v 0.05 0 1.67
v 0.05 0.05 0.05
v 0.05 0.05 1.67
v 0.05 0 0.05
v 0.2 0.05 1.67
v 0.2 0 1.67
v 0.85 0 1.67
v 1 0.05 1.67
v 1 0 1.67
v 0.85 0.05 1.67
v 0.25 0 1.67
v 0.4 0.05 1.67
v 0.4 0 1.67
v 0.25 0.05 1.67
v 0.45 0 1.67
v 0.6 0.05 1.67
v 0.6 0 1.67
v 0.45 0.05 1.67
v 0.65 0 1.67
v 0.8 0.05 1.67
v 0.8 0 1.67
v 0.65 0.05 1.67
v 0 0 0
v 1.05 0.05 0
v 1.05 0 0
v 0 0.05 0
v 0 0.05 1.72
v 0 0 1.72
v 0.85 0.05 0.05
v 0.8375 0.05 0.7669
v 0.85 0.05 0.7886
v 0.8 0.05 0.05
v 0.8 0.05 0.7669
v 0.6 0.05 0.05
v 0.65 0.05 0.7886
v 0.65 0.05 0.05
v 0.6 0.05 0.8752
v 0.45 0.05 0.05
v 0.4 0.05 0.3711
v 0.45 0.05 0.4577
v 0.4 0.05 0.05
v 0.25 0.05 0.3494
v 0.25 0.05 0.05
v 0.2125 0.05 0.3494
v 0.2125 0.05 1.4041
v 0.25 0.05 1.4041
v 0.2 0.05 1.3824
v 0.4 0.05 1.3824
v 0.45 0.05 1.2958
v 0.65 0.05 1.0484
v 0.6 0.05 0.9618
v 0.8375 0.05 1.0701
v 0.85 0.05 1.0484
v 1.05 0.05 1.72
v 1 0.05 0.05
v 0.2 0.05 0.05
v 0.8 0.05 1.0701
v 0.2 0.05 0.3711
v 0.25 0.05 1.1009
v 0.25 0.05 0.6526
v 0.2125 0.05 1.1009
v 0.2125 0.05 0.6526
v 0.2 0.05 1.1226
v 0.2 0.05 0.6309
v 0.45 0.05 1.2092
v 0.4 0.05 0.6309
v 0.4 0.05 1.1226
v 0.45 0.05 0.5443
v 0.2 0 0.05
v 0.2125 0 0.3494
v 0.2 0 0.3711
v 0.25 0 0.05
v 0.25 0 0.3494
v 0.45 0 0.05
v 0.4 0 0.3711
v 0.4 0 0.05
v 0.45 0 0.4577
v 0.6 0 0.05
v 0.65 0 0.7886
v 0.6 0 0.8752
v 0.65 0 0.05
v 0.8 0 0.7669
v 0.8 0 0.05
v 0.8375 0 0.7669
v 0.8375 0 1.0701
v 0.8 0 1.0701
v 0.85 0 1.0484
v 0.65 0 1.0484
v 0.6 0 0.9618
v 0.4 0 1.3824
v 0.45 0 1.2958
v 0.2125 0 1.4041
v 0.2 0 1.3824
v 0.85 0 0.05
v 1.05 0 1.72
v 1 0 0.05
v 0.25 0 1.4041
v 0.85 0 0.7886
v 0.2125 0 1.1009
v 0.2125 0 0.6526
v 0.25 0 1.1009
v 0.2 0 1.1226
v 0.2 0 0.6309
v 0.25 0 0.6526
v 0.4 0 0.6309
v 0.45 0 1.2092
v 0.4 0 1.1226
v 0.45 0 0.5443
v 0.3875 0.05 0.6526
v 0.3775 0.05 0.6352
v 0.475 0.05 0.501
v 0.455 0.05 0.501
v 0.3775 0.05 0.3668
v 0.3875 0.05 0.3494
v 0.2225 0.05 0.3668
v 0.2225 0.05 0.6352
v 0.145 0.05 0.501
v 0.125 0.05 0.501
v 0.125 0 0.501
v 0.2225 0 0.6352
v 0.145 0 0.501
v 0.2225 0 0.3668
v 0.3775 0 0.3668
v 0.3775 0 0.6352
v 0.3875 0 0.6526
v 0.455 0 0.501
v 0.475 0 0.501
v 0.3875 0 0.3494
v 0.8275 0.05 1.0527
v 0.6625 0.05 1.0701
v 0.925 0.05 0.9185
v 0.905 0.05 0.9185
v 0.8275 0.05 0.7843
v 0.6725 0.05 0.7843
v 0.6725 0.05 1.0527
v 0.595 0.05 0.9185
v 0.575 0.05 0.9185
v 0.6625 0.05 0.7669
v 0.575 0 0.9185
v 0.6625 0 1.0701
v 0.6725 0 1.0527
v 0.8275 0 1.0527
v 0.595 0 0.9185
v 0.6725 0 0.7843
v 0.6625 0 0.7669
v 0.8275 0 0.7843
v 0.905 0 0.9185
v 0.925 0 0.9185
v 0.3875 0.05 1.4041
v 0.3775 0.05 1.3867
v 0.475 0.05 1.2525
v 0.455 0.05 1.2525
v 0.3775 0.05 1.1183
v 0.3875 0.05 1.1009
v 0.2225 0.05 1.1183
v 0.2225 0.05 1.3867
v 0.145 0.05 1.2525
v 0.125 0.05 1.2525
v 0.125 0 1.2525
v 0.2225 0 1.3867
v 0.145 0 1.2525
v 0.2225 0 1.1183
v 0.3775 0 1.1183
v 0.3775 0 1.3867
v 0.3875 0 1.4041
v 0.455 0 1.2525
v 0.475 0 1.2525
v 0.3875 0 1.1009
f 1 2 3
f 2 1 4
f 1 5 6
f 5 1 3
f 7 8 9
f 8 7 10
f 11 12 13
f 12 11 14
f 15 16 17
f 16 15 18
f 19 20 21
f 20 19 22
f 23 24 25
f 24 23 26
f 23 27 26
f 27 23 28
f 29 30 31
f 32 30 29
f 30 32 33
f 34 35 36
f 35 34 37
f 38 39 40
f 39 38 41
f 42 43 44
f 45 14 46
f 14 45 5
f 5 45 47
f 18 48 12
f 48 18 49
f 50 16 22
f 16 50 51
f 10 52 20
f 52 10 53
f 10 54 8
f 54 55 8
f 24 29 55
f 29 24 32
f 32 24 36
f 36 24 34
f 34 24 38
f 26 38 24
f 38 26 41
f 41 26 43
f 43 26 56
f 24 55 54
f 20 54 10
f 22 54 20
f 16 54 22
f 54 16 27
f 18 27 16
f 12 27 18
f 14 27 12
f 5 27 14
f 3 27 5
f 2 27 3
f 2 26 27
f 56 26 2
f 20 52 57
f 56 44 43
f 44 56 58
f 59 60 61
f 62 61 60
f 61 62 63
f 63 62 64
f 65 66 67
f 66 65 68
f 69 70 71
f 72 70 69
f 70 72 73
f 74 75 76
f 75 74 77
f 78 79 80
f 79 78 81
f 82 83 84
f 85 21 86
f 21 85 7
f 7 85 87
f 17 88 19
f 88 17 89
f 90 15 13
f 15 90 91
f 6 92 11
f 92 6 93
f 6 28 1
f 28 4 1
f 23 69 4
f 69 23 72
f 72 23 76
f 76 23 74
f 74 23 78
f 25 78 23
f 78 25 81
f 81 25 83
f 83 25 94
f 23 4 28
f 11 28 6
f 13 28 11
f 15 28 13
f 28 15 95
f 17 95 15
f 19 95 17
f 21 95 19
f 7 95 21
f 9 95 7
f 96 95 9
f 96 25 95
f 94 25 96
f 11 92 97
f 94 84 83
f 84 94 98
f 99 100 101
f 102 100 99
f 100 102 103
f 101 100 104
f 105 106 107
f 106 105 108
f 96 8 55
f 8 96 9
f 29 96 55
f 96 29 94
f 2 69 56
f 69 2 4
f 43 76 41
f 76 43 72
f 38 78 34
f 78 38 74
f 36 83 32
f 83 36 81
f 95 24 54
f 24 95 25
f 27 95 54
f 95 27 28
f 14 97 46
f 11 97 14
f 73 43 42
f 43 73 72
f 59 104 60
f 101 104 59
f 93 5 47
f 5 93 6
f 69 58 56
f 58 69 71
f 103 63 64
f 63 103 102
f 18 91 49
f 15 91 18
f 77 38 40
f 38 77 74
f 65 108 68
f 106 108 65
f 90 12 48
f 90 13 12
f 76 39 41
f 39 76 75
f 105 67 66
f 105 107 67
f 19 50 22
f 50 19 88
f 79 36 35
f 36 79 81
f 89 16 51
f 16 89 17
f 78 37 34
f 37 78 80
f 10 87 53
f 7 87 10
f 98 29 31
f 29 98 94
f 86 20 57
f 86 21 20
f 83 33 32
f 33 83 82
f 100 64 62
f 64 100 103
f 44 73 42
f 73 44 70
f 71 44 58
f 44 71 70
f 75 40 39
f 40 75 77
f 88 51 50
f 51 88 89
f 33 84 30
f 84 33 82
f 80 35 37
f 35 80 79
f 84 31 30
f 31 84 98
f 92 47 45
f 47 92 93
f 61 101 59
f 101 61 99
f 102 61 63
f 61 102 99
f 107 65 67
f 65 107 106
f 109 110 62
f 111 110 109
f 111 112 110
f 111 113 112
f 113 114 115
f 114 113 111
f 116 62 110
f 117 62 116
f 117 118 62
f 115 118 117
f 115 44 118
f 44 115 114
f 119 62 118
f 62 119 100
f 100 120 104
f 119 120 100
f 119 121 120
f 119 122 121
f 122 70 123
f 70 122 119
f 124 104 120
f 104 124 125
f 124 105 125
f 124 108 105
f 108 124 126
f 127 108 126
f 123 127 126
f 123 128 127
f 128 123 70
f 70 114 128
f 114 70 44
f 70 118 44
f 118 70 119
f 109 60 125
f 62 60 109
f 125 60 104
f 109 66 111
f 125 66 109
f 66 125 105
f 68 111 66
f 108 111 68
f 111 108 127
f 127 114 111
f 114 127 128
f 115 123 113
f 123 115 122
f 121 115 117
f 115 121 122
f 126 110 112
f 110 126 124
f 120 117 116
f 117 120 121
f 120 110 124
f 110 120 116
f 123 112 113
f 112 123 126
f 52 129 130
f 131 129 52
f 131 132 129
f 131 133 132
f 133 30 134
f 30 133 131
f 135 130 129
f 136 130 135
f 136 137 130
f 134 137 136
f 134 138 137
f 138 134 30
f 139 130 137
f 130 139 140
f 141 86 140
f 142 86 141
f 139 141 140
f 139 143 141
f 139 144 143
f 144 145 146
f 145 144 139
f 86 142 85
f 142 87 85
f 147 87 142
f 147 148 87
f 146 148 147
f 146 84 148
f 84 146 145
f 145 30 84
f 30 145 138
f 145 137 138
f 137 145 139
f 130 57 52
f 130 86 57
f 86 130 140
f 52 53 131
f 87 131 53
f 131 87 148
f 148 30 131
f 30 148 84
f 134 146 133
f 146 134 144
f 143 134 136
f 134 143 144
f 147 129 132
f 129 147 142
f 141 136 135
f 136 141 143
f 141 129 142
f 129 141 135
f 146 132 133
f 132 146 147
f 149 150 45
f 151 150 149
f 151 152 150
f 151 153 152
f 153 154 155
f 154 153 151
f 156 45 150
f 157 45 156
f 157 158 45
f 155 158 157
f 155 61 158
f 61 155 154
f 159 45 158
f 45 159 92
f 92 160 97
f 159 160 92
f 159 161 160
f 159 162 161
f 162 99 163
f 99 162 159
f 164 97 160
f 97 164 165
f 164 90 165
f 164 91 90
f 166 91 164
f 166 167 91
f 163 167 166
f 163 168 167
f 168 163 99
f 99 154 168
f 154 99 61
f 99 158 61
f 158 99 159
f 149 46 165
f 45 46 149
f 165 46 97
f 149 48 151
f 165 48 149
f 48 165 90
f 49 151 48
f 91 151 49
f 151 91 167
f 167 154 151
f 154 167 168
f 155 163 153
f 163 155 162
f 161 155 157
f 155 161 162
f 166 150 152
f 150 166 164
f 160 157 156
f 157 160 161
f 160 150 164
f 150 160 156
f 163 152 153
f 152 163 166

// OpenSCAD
$fn = 6;

claustra_x = 1;
claustra_y = 0.05;
claustra_z = 1.67;

framing(claustra_x,claustra_y,claustra_z);
difference()
{
    beams(claustra_x, claustra_y, claustra_z, 5);
    
translate([claustra_x*0.3, claustra_y, claustra_z*0.3])
    rotate([90, 0, 0])
        hexagon(claustra_y, claustra_y*2, claustra_y);

translate([claustra_x*0.75, claustra_y, claustra_z*0.55])
    rotate([90, 0, 0])
        hexagon(claustra_y, claustra_y*2, claustra_y);

translate([claustra_x*0.3, claustra_y, claustra_z*0.75])
    rotate([90, 0, 0])
        hexagon(claustra_y, claustra_y*2, claustra_y);
}


translate([claustra_x*0.3, claustra_y, claustra_z*0.3])
    rotate([90, 0, 0])
        beehive(claustra_y, claustra_y*2, claustra_y);

translate([claustra_x*0.75, claustra_y, claustra_z*0.55])
    rotate([90, 0, 0])
        beehive(claustra_y, claustra_y*2, claustra_y);

translate([claustra_x*0.3, claustra_y, claustra_z*0.75])
    rotate([90, 0, 0])
        beehive(claustra_y, claustra_y*2, claustra_y);

module beams(x, y, h, n)
{
    for(i = [0: x/n: x])
    {
        translate([i, 0, 0])
            cube([y,y,h]);
    }
}

module framing(l, L, h)
{
    cube([L,L,h]);
    cube([l,L,L]);
    translate([l, 0, 0])
        cube([L,L,h]);
    translate([0, 0, h])
        cube([l+L,L,L]);
}

module vgrid(l, L, h)
{
    N = 10;
    step = l/N;
    for(i=[0: l/N :l])
    {
        translate([i*step, L, h])
            cube([1, 1, 1]);
    }
}

module hexagon(w, r, h)
{
    hull()
    {
        translate([w/2-r,0,0])
            cylinder(r=r, h=h);
        rotate([0,0,60])
            translate([w/2-r,0,0])
                cylinder(r=r, h=h);
        rotate([0,0,120])
            translate([w/2-r,0,0])
                cylinder(r=r, h=h);
        rotate([0,0,180])
            translate([w/2-r,0,0])
                cylinder(r=r, h=h);
        rotate([0,0,240])
            translate([w/2-r,0,0])
                cylinder(r=r, h=h);
        rotate([0,0,300])
            translate([w/2-r,0,0])
                cylinder(r=r, h=h);
    }
}

module beehive(w, r, h)
{
    difference(){
        hexagon(w, r, h);
        hexagon(w, r-r/10, h+1);
    }
}
